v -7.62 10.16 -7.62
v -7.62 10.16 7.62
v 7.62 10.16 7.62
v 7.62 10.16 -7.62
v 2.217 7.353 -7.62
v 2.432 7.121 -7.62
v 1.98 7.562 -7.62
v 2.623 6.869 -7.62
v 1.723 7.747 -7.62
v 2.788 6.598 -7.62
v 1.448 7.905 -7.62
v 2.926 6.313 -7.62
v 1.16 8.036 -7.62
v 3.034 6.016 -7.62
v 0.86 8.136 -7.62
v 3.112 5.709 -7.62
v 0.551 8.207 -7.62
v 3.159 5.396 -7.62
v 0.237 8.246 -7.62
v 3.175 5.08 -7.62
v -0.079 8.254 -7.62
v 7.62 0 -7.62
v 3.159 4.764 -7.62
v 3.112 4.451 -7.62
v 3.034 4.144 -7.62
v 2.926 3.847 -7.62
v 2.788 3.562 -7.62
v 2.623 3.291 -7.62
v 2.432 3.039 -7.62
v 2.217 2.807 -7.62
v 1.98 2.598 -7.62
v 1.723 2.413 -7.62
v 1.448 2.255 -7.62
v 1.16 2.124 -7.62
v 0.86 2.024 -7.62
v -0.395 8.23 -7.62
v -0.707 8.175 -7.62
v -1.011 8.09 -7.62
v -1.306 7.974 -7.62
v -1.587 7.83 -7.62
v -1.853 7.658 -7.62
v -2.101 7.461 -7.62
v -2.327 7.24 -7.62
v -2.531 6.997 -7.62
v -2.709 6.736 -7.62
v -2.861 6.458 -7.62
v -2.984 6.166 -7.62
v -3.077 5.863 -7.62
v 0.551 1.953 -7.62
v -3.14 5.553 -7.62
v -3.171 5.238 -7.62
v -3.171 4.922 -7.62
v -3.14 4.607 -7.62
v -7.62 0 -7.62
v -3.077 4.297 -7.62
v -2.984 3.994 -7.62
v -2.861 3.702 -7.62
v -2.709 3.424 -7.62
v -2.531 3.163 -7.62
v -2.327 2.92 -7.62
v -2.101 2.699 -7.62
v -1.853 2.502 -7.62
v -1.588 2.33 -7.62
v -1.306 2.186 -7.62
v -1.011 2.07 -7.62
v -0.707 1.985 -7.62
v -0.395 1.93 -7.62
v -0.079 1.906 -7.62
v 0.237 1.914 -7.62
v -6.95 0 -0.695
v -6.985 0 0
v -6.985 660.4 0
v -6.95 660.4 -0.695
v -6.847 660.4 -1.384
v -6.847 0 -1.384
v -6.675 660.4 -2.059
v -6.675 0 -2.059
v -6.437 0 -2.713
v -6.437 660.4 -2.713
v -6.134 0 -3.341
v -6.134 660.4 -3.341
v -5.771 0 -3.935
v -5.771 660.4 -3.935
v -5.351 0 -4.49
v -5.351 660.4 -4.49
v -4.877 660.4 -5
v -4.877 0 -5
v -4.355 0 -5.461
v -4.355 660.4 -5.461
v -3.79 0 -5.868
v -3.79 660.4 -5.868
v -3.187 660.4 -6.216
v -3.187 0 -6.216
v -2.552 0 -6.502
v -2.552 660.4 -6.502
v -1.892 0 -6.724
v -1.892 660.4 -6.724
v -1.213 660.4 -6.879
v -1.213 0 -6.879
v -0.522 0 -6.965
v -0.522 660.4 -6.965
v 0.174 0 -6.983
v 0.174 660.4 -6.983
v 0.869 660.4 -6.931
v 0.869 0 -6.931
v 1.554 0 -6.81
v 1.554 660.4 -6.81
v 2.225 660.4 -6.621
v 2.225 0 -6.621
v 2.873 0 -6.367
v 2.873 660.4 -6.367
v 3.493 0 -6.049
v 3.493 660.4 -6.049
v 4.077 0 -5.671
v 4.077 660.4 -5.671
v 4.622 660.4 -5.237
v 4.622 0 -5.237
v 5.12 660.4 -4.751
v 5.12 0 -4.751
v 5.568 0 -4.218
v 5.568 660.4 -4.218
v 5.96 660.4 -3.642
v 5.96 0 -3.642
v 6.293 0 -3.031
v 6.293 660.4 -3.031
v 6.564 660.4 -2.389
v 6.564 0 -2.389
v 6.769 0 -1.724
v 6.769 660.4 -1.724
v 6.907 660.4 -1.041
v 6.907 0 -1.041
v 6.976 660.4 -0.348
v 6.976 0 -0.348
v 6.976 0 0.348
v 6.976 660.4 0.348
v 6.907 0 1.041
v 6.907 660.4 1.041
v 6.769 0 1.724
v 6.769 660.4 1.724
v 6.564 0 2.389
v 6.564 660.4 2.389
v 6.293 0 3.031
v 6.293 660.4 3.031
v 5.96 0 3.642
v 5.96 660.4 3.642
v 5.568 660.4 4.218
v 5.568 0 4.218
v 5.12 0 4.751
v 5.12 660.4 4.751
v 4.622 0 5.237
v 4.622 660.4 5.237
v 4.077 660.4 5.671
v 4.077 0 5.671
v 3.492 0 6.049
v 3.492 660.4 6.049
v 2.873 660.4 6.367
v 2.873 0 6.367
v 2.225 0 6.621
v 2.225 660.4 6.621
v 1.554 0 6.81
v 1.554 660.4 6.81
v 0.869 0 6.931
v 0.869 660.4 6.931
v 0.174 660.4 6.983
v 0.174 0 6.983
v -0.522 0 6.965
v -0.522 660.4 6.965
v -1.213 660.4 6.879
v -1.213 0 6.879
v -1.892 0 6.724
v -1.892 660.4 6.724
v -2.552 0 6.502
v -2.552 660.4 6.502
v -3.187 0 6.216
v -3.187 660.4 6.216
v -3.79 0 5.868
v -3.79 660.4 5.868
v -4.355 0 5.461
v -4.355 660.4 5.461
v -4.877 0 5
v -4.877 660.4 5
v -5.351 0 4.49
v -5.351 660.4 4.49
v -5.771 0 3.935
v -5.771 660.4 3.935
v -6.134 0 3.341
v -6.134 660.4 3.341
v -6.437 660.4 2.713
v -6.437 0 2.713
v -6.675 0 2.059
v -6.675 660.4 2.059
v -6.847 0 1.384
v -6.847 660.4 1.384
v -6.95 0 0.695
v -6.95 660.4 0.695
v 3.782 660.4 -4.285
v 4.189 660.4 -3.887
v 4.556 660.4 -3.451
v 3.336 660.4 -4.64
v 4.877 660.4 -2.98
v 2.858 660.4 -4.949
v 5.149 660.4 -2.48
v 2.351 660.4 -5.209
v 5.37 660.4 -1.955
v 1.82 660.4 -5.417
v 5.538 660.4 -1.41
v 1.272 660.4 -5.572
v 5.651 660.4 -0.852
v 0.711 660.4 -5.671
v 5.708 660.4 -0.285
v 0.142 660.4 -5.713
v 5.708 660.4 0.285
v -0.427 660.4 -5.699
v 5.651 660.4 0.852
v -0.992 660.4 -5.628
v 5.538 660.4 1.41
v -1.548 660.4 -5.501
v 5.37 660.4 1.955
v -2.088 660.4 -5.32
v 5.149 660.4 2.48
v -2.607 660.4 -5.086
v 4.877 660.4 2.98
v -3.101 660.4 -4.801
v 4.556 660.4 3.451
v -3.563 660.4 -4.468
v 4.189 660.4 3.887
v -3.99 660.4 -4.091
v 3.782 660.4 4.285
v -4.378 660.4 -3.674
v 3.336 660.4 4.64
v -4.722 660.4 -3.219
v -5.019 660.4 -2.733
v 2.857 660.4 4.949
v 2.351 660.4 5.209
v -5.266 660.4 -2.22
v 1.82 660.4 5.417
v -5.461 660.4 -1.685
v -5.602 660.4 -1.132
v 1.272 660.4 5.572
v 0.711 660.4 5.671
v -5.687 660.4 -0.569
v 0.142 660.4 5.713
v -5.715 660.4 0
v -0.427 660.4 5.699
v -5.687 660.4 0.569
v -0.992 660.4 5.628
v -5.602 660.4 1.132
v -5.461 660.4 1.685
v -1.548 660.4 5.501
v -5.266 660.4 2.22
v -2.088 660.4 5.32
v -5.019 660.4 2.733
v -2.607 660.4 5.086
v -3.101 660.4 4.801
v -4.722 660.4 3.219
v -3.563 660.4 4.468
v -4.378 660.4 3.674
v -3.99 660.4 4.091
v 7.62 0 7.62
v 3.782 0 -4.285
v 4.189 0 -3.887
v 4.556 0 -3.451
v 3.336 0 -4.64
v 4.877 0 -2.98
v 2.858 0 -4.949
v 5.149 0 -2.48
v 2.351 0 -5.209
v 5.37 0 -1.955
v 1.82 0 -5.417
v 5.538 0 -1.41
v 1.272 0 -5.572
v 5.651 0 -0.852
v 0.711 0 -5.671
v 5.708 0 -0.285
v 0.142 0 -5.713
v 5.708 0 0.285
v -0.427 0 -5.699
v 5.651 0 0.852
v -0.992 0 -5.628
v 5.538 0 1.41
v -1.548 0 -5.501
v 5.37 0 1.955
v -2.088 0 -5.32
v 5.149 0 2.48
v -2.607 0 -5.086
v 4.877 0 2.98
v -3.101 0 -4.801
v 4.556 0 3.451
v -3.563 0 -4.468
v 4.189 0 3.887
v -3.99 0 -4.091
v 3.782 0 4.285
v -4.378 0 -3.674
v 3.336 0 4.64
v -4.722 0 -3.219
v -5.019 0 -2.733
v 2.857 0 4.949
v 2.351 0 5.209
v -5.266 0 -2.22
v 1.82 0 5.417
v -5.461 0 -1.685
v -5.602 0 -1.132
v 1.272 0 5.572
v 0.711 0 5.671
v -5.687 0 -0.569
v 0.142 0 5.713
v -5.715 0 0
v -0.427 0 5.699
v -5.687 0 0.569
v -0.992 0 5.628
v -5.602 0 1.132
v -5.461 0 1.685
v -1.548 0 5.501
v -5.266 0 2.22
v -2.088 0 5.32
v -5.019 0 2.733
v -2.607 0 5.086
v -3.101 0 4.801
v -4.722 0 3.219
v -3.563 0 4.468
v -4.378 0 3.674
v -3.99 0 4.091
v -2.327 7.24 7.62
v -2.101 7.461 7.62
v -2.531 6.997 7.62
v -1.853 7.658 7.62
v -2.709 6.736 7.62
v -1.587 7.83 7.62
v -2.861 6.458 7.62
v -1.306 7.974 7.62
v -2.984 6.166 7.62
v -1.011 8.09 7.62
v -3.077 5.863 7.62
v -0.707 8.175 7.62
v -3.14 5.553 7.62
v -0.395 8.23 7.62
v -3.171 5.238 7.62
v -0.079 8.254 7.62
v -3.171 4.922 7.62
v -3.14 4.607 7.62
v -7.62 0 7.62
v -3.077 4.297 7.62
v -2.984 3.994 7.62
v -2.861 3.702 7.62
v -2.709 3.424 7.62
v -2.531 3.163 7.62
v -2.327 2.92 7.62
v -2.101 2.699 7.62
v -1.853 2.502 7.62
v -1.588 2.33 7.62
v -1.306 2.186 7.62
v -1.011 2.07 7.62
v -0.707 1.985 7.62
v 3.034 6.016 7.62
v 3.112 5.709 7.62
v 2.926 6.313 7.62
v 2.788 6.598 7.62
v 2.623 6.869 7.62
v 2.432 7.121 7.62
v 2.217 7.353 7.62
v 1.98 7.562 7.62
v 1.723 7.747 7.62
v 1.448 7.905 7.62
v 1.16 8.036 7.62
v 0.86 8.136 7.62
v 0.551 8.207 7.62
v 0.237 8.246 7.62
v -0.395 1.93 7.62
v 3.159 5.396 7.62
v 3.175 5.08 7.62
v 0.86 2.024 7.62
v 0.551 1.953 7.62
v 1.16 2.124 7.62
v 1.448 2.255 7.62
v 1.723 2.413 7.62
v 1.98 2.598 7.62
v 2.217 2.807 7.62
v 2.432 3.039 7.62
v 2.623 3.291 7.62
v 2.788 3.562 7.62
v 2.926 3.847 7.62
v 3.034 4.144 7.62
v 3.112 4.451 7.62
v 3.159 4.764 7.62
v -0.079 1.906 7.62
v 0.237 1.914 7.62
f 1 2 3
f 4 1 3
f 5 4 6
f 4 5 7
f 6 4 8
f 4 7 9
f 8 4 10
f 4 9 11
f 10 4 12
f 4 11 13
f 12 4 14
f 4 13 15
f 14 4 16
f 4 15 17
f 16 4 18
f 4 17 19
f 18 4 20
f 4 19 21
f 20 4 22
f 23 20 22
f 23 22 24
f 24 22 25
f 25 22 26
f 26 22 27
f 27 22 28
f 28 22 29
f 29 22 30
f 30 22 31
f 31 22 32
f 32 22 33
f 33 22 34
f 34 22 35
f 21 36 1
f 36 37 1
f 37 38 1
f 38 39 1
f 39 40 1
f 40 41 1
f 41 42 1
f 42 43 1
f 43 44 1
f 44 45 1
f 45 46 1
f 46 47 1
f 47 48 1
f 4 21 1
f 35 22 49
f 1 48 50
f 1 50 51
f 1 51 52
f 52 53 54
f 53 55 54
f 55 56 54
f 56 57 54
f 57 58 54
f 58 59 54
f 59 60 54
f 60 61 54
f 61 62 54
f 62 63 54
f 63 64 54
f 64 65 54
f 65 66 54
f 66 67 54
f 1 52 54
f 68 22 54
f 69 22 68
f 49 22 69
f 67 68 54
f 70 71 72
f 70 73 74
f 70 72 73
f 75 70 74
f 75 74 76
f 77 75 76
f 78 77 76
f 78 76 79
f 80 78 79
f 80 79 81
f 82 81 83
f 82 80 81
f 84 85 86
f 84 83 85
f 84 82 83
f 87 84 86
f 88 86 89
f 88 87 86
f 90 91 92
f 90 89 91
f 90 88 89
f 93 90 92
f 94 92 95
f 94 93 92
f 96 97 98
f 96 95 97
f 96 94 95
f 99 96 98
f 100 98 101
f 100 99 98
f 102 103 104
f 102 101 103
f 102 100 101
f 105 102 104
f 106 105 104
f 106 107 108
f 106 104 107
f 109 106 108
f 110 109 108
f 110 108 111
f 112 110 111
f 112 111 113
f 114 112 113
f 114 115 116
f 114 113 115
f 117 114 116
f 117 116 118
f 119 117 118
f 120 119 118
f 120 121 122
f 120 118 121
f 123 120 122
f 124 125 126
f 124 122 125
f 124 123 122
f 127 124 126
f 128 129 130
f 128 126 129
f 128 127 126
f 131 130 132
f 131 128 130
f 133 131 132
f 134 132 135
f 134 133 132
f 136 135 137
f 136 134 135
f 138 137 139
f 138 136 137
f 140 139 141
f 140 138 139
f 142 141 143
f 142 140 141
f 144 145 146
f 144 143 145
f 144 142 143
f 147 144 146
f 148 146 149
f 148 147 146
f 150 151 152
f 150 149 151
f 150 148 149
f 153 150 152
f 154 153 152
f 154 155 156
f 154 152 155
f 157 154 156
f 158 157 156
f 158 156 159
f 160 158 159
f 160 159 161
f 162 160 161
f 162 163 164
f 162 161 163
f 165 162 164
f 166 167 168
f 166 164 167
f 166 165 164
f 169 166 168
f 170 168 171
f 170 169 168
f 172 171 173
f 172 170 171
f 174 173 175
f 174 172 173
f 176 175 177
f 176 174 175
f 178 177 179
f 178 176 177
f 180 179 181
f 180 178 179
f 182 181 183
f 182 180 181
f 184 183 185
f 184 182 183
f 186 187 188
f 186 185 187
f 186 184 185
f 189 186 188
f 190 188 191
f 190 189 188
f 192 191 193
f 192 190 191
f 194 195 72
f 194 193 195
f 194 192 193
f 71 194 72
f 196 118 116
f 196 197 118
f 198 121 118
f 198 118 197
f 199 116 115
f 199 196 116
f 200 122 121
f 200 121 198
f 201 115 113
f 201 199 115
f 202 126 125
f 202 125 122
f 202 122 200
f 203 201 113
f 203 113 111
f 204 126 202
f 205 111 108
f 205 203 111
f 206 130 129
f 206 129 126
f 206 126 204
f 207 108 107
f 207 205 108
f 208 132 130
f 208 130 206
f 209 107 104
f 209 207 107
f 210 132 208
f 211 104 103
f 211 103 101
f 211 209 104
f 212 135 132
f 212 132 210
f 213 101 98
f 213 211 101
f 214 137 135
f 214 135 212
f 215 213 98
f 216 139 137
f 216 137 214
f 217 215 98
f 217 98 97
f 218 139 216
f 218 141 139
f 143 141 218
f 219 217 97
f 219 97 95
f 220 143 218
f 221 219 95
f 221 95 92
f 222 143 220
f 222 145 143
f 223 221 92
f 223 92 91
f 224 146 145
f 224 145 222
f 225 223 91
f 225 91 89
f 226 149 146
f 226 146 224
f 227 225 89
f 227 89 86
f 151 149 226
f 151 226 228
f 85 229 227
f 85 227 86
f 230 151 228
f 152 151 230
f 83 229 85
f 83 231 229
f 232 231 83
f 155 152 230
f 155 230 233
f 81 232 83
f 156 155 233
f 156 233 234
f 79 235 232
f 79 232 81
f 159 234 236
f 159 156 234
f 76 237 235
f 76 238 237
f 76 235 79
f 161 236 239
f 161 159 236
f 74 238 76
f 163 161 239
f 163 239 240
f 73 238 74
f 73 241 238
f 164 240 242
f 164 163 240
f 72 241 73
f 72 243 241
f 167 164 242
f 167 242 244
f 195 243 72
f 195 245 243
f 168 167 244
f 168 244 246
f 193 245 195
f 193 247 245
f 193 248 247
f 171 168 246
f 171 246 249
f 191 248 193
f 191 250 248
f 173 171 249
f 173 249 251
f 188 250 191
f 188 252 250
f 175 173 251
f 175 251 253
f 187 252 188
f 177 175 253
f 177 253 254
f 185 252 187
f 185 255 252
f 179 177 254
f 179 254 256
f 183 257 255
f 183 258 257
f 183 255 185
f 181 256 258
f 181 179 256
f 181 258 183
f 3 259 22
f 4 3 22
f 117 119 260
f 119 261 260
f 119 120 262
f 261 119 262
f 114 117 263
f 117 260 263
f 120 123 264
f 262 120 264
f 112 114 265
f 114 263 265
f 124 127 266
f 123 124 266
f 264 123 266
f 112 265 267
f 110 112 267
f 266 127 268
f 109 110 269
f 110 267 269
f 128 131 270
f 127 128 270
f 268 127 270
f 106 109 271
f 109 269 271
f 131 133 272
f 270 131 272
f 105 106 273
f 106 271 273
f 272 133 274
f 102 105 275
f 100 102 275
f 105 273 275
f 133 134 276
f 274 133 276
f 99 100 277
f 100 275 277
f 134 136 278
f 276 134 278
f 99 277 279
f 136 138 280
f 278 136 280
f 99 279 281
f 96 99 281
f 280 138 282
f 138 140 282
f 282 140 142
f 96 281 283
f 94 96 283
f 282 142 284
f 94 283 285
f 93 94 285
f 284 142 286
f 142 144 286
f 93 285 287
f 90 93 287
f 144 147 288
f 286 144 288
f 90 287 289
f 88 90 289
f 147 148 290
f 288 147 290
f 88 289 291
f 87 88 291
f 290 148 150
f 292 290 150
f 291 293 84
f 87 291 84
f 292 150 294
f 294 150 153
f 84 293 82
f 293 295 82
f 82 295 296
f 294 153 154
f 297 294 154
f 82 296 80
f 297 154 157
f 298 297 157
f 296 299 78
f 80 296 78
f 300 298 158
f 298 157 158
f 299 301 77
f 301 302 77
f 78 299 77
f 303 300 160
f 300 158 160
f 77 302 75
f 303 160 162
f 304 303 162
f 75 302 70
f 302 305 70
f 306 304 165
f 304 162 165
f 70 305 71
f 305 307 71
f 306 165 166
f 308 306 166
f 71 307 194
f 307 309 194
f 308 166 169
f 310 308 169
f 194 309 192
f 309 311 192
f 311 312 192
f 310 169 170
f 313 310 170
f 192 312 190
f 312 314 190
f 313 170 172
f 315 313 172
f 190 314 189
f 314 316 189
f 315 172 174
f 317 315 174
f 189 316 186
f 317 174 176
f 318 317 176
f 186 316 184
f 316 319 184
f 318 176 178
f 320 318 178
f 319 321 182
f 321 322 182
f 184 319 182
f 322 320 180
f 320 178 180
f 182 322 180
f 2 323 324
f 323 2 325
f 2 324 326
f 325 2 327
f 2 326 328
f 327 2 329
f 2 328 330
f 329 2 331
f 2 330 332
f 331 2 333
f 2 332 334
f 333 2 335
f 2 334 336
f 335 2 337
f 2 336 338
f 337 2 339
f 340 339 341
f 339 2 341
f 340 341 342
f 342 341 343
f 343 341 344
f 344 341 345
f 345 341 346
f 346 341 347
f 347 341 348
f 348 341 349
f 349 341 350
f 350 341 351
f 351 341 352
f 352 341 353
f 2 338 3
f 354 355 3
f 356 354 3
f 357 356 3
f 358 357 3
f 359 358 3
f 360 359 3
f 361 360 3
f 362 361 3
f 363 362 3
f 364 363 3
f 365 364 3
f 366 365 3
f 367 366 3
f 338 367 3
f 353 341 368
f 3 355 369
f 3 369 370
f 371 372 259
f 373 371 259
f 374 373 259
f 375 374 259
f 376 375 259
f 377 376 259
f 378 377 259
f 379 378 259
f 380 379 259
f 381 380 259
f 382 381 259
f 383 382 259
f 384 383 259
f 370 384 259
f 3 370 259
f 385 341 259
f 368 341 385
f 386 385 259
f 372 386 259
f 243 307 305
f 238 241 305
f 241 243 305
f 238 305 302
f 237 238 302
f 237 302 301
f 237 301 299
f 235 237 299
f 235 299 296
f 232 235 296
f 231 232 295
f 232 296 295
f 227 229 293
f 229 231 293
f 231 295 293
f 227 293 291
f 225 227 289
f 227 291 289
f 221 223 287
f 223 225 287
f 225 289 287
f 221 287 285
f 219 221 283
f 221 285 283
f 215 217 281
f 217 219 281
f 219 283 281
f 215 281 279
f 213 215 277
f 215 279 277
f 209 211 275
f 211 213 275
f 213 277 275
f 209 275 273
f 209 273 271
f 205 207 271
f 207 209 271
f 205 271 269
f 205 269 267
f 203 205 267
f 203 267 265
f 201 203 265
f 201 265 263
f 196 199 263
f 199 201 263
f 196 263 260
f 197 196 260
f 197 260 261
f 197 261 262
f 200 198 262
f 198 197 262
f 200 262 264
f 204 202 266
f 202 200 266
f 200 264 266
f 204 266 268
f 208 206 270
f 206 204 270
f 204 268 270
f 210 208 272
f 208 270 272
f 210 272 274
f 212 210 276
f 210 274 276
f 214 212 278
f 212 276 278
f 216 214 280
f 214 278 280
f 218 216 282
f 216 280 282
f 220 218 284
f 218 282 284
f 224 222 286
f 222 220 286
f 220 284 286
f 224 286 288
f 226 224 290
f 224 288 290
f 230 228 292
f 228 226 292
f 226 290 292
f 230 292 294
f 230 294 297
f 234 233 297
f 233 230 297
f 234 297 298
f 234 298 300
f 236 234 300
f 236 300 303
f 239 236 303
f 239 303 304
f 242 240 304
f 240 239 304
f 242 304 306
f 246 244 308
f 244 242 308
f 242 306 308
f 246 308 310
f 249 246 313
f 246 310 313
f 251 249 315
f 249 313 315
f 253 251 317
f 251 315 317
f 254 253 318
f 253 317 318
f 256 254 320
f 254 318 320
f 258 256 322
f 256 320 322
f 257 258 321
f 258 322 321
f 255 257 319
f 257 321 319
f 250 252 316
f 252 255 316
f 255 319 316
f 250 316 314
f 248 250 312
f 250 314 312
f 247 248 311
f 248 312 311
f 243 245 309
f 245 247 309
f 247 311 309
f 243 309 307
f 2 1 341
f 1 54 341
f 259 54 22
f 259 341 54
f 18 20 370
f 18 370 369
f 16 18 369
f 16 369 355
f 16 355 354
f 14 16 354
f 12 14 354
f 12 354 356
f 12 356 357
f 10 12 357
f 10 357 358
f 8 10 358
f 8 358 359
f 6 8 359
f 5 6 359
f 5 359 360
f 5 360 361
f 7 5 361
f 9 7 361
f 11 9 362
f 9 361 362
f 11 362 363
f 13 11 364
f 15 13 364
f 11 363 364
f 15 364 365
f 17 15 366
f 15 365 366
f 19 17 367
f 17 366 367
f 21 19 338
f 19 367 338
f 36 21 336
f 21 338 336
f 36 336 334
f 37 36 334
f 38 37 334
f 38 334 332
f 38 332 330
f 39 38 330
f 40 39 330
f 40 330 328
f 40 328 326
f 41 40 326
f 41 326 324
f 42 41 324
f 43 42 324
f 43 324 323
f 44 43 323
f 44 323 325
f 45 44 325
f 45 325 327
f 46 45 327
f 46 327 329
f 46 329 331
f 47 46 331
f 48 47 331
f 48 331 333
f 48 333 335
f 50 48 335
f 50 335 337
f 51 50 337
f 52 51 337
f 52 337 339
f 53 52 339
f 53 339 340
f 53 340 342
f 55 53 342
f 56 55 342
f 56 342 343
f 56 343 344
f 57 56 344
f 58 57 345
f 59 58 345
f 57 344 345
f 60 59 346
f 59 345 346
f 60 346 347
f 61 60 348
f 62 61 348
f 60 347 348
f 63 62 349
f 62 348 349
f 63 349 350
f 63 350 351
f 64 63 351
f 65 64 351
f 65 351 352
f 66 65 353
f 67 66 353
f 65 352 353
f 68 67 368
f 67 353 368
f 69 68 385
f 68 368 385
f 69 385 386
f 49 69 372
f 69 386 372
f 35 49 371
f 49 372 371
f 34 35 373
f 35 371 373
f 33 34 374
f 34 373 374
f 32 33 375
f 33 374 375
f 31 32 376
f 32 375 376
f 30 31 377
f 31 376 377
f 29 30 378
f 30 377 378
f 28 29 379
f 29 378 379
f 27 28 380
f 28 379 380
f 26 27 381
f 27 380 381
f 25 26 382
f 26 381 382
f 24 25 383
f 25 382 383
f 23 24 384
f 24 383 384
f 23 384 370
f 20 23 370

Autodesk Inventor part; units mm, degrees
ref_plane "YZ Plane" through (0, 0, 0) normal (1, 0, 0) x (0, 1, 0)
ref_plane "XZ Plane" through (0, 0, 0) normal (0, 1, 0) x (-1, 0, 0)
ref_plane "XY Plane" through (0, 0, 0) normal (0, 0, 1) x (1, 0, 0)
sketch "Sketch1" plane through (0, 0, 0) normal (0, 1, 0) x (-1, 0, 0)
  circle A0 centre (0, 0) radius 6.985
  circle A1 centre (0, 0) radius 5.715
  dimension "d0" = 13.97
  dimension "d1" = 11.43
extrude "Extrusion1" add sketch "Sketch1" along normal blind 660.4
sketch "Sketch3" plane through (0, 0, 0) normal (0, -1, 0) x (1, 0, 0)
  line L0 (7.62, -7.62) -> (-7.62, -7.62)
  line L1 (-7.62, -7.62) -> (-7.62, 7.62)
  line L2 (-7.62, 7.62) -> (7.62, 7.62)
  line L3 (7.62, 7.62) -> (7.62, -7.62)
  line L4 (7.62, 0) -> (-7.62, 0) construction
  line L5 (0, -7.62) -> (0, 7.62) construction
  point P0 (0, 0)
  point P1 (0, 0)
  dimension "d4" = 15.24
  dimension "d5" = 15.24
  dimension "d6" = 7.62
  dimension "d7" = 7.62
extrude "Extrusion2" add sketch "Sketch3" against normal blind 10.16 separate body
sketch "Sketch4" plane through (-7.62, 0, 7.62) normal (0, 0, 1) x (1, 0, 0)
  line L0 (0, 0) -> (0, 10.16) projected
  line L1 (15.24, 0) -> (15.24, 10.16) projected
  circle A0 centre (7.62, 5.08) radius 3.175
  point P0 (7.62, 0)
  dimension "d10" = 6.35
extrude "Extrusion3" cut sketch "Sketch4" against normal blind 26.3525 bodies 2
properties part number "InnerLever"
